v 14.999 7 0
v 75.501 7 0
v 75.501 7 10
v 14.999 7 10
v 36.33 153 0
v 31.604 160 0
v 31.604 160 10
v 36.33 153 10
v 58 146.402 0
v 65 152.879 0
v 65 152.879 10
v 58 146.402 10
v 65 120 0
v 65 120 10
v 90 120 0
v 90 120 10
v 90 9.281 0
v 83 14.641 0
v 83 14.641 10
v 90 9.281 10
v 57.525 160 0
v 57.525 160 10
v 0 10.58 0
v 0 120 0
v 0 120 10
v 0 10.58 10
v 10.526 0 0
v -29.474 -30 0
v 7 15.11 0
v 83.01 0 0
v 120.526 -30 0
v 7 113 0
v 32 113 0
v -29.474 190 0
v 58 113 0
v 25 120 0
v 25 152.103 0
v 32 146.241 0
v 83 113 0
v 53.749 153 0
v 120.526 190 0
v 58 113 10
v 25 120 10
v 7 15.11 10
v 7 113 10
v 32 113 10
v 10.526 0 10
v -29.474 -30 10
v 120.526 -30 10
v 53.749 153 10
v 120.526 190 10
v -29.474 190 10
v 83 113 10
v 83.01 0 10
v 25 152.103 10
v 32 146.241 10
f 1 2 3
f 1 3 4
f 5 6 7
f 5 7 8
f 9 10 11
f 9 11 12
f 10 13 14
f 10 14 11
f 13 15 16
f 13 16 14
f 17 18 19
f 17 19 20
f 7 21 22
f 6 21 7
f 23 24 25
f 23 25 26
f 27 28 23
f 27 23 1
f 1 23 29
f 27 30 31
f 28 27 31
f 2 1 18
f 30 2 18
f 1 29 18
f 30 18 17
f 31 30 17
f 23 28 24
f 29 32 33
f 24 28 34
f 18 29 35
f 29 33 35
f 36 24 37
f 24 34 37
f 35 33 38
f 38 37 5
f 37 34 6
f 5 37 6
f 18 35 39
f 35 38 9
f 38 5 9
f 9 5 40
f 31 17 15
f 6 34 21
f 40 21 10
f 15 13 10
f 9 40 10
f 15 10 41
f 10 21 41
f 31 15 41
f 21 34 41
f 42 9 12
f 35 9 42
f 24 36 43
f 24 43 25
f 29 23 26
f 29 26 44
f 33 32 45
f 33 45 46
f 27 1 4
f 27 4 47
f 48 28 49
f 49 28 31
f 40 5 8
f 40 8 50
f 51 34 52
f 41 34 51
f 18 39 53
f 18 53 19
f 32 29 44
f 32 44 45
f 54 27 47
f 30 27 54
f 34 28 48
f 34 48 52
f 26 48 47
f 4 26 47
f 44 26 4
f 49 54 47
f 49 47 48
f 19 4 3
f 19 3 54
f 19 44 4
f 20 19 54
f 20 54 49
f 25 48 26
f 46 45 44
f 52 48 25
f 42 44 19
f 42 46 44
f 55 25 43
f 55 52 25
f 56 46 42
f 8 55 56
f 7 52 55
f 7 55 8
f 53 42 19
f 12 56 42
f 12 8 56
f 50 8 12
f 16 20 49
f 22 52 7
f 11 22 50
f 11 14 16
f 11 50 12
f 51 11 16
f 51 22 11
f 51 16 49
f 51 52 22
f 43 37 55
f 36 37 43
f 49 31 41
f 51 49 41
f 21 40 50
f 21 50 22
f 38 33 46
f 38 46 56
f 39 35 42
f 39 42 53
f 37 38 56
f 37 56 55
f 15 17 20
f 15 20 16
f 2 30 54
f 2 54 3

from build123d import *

# Parameters (mm, degrees)
F1_W     = 150
F1_H     = 220
F2_DEPTH = 10
F3_DEPTH = 25


with BuildPart() as f2:
    # F1 (on Top) → F2 (new body)
    with BuildSketch(Plane.XY):
        with Locations((45.525713, 80)):
            Rectangle(F1_W, F1_H)
    extrude(amount=F2_DEPTH)

    # F0 (on Top) → F3 (cut)
    with BuildSketch(Plane.XY):
        Polygon((14.999021, 7), (10.525713, 0), (83.010264, 0), (75.500965, 7), align=None)
        Polygon((25, 120), (0, 120), (0, 10.580182), (7, 15.109896), (7, 113), (32, 113), (32, 146.241054), (25, 152.102575), align=None)
        Polygon((83, 14.64067), (90, 9.280561), (90, 120), (65, 120), (65, 152.879447), (58, 146.40218), (58, 113), (83, 113), align=None)
        Polygon((57.524528, 160), (31.603869, 160), (36.329959, 153), (53.748887, 153), align=None)
    extrude(amount=F3_DEPTH, mode=Mode.SUBTRACT)


solid = f2.part
